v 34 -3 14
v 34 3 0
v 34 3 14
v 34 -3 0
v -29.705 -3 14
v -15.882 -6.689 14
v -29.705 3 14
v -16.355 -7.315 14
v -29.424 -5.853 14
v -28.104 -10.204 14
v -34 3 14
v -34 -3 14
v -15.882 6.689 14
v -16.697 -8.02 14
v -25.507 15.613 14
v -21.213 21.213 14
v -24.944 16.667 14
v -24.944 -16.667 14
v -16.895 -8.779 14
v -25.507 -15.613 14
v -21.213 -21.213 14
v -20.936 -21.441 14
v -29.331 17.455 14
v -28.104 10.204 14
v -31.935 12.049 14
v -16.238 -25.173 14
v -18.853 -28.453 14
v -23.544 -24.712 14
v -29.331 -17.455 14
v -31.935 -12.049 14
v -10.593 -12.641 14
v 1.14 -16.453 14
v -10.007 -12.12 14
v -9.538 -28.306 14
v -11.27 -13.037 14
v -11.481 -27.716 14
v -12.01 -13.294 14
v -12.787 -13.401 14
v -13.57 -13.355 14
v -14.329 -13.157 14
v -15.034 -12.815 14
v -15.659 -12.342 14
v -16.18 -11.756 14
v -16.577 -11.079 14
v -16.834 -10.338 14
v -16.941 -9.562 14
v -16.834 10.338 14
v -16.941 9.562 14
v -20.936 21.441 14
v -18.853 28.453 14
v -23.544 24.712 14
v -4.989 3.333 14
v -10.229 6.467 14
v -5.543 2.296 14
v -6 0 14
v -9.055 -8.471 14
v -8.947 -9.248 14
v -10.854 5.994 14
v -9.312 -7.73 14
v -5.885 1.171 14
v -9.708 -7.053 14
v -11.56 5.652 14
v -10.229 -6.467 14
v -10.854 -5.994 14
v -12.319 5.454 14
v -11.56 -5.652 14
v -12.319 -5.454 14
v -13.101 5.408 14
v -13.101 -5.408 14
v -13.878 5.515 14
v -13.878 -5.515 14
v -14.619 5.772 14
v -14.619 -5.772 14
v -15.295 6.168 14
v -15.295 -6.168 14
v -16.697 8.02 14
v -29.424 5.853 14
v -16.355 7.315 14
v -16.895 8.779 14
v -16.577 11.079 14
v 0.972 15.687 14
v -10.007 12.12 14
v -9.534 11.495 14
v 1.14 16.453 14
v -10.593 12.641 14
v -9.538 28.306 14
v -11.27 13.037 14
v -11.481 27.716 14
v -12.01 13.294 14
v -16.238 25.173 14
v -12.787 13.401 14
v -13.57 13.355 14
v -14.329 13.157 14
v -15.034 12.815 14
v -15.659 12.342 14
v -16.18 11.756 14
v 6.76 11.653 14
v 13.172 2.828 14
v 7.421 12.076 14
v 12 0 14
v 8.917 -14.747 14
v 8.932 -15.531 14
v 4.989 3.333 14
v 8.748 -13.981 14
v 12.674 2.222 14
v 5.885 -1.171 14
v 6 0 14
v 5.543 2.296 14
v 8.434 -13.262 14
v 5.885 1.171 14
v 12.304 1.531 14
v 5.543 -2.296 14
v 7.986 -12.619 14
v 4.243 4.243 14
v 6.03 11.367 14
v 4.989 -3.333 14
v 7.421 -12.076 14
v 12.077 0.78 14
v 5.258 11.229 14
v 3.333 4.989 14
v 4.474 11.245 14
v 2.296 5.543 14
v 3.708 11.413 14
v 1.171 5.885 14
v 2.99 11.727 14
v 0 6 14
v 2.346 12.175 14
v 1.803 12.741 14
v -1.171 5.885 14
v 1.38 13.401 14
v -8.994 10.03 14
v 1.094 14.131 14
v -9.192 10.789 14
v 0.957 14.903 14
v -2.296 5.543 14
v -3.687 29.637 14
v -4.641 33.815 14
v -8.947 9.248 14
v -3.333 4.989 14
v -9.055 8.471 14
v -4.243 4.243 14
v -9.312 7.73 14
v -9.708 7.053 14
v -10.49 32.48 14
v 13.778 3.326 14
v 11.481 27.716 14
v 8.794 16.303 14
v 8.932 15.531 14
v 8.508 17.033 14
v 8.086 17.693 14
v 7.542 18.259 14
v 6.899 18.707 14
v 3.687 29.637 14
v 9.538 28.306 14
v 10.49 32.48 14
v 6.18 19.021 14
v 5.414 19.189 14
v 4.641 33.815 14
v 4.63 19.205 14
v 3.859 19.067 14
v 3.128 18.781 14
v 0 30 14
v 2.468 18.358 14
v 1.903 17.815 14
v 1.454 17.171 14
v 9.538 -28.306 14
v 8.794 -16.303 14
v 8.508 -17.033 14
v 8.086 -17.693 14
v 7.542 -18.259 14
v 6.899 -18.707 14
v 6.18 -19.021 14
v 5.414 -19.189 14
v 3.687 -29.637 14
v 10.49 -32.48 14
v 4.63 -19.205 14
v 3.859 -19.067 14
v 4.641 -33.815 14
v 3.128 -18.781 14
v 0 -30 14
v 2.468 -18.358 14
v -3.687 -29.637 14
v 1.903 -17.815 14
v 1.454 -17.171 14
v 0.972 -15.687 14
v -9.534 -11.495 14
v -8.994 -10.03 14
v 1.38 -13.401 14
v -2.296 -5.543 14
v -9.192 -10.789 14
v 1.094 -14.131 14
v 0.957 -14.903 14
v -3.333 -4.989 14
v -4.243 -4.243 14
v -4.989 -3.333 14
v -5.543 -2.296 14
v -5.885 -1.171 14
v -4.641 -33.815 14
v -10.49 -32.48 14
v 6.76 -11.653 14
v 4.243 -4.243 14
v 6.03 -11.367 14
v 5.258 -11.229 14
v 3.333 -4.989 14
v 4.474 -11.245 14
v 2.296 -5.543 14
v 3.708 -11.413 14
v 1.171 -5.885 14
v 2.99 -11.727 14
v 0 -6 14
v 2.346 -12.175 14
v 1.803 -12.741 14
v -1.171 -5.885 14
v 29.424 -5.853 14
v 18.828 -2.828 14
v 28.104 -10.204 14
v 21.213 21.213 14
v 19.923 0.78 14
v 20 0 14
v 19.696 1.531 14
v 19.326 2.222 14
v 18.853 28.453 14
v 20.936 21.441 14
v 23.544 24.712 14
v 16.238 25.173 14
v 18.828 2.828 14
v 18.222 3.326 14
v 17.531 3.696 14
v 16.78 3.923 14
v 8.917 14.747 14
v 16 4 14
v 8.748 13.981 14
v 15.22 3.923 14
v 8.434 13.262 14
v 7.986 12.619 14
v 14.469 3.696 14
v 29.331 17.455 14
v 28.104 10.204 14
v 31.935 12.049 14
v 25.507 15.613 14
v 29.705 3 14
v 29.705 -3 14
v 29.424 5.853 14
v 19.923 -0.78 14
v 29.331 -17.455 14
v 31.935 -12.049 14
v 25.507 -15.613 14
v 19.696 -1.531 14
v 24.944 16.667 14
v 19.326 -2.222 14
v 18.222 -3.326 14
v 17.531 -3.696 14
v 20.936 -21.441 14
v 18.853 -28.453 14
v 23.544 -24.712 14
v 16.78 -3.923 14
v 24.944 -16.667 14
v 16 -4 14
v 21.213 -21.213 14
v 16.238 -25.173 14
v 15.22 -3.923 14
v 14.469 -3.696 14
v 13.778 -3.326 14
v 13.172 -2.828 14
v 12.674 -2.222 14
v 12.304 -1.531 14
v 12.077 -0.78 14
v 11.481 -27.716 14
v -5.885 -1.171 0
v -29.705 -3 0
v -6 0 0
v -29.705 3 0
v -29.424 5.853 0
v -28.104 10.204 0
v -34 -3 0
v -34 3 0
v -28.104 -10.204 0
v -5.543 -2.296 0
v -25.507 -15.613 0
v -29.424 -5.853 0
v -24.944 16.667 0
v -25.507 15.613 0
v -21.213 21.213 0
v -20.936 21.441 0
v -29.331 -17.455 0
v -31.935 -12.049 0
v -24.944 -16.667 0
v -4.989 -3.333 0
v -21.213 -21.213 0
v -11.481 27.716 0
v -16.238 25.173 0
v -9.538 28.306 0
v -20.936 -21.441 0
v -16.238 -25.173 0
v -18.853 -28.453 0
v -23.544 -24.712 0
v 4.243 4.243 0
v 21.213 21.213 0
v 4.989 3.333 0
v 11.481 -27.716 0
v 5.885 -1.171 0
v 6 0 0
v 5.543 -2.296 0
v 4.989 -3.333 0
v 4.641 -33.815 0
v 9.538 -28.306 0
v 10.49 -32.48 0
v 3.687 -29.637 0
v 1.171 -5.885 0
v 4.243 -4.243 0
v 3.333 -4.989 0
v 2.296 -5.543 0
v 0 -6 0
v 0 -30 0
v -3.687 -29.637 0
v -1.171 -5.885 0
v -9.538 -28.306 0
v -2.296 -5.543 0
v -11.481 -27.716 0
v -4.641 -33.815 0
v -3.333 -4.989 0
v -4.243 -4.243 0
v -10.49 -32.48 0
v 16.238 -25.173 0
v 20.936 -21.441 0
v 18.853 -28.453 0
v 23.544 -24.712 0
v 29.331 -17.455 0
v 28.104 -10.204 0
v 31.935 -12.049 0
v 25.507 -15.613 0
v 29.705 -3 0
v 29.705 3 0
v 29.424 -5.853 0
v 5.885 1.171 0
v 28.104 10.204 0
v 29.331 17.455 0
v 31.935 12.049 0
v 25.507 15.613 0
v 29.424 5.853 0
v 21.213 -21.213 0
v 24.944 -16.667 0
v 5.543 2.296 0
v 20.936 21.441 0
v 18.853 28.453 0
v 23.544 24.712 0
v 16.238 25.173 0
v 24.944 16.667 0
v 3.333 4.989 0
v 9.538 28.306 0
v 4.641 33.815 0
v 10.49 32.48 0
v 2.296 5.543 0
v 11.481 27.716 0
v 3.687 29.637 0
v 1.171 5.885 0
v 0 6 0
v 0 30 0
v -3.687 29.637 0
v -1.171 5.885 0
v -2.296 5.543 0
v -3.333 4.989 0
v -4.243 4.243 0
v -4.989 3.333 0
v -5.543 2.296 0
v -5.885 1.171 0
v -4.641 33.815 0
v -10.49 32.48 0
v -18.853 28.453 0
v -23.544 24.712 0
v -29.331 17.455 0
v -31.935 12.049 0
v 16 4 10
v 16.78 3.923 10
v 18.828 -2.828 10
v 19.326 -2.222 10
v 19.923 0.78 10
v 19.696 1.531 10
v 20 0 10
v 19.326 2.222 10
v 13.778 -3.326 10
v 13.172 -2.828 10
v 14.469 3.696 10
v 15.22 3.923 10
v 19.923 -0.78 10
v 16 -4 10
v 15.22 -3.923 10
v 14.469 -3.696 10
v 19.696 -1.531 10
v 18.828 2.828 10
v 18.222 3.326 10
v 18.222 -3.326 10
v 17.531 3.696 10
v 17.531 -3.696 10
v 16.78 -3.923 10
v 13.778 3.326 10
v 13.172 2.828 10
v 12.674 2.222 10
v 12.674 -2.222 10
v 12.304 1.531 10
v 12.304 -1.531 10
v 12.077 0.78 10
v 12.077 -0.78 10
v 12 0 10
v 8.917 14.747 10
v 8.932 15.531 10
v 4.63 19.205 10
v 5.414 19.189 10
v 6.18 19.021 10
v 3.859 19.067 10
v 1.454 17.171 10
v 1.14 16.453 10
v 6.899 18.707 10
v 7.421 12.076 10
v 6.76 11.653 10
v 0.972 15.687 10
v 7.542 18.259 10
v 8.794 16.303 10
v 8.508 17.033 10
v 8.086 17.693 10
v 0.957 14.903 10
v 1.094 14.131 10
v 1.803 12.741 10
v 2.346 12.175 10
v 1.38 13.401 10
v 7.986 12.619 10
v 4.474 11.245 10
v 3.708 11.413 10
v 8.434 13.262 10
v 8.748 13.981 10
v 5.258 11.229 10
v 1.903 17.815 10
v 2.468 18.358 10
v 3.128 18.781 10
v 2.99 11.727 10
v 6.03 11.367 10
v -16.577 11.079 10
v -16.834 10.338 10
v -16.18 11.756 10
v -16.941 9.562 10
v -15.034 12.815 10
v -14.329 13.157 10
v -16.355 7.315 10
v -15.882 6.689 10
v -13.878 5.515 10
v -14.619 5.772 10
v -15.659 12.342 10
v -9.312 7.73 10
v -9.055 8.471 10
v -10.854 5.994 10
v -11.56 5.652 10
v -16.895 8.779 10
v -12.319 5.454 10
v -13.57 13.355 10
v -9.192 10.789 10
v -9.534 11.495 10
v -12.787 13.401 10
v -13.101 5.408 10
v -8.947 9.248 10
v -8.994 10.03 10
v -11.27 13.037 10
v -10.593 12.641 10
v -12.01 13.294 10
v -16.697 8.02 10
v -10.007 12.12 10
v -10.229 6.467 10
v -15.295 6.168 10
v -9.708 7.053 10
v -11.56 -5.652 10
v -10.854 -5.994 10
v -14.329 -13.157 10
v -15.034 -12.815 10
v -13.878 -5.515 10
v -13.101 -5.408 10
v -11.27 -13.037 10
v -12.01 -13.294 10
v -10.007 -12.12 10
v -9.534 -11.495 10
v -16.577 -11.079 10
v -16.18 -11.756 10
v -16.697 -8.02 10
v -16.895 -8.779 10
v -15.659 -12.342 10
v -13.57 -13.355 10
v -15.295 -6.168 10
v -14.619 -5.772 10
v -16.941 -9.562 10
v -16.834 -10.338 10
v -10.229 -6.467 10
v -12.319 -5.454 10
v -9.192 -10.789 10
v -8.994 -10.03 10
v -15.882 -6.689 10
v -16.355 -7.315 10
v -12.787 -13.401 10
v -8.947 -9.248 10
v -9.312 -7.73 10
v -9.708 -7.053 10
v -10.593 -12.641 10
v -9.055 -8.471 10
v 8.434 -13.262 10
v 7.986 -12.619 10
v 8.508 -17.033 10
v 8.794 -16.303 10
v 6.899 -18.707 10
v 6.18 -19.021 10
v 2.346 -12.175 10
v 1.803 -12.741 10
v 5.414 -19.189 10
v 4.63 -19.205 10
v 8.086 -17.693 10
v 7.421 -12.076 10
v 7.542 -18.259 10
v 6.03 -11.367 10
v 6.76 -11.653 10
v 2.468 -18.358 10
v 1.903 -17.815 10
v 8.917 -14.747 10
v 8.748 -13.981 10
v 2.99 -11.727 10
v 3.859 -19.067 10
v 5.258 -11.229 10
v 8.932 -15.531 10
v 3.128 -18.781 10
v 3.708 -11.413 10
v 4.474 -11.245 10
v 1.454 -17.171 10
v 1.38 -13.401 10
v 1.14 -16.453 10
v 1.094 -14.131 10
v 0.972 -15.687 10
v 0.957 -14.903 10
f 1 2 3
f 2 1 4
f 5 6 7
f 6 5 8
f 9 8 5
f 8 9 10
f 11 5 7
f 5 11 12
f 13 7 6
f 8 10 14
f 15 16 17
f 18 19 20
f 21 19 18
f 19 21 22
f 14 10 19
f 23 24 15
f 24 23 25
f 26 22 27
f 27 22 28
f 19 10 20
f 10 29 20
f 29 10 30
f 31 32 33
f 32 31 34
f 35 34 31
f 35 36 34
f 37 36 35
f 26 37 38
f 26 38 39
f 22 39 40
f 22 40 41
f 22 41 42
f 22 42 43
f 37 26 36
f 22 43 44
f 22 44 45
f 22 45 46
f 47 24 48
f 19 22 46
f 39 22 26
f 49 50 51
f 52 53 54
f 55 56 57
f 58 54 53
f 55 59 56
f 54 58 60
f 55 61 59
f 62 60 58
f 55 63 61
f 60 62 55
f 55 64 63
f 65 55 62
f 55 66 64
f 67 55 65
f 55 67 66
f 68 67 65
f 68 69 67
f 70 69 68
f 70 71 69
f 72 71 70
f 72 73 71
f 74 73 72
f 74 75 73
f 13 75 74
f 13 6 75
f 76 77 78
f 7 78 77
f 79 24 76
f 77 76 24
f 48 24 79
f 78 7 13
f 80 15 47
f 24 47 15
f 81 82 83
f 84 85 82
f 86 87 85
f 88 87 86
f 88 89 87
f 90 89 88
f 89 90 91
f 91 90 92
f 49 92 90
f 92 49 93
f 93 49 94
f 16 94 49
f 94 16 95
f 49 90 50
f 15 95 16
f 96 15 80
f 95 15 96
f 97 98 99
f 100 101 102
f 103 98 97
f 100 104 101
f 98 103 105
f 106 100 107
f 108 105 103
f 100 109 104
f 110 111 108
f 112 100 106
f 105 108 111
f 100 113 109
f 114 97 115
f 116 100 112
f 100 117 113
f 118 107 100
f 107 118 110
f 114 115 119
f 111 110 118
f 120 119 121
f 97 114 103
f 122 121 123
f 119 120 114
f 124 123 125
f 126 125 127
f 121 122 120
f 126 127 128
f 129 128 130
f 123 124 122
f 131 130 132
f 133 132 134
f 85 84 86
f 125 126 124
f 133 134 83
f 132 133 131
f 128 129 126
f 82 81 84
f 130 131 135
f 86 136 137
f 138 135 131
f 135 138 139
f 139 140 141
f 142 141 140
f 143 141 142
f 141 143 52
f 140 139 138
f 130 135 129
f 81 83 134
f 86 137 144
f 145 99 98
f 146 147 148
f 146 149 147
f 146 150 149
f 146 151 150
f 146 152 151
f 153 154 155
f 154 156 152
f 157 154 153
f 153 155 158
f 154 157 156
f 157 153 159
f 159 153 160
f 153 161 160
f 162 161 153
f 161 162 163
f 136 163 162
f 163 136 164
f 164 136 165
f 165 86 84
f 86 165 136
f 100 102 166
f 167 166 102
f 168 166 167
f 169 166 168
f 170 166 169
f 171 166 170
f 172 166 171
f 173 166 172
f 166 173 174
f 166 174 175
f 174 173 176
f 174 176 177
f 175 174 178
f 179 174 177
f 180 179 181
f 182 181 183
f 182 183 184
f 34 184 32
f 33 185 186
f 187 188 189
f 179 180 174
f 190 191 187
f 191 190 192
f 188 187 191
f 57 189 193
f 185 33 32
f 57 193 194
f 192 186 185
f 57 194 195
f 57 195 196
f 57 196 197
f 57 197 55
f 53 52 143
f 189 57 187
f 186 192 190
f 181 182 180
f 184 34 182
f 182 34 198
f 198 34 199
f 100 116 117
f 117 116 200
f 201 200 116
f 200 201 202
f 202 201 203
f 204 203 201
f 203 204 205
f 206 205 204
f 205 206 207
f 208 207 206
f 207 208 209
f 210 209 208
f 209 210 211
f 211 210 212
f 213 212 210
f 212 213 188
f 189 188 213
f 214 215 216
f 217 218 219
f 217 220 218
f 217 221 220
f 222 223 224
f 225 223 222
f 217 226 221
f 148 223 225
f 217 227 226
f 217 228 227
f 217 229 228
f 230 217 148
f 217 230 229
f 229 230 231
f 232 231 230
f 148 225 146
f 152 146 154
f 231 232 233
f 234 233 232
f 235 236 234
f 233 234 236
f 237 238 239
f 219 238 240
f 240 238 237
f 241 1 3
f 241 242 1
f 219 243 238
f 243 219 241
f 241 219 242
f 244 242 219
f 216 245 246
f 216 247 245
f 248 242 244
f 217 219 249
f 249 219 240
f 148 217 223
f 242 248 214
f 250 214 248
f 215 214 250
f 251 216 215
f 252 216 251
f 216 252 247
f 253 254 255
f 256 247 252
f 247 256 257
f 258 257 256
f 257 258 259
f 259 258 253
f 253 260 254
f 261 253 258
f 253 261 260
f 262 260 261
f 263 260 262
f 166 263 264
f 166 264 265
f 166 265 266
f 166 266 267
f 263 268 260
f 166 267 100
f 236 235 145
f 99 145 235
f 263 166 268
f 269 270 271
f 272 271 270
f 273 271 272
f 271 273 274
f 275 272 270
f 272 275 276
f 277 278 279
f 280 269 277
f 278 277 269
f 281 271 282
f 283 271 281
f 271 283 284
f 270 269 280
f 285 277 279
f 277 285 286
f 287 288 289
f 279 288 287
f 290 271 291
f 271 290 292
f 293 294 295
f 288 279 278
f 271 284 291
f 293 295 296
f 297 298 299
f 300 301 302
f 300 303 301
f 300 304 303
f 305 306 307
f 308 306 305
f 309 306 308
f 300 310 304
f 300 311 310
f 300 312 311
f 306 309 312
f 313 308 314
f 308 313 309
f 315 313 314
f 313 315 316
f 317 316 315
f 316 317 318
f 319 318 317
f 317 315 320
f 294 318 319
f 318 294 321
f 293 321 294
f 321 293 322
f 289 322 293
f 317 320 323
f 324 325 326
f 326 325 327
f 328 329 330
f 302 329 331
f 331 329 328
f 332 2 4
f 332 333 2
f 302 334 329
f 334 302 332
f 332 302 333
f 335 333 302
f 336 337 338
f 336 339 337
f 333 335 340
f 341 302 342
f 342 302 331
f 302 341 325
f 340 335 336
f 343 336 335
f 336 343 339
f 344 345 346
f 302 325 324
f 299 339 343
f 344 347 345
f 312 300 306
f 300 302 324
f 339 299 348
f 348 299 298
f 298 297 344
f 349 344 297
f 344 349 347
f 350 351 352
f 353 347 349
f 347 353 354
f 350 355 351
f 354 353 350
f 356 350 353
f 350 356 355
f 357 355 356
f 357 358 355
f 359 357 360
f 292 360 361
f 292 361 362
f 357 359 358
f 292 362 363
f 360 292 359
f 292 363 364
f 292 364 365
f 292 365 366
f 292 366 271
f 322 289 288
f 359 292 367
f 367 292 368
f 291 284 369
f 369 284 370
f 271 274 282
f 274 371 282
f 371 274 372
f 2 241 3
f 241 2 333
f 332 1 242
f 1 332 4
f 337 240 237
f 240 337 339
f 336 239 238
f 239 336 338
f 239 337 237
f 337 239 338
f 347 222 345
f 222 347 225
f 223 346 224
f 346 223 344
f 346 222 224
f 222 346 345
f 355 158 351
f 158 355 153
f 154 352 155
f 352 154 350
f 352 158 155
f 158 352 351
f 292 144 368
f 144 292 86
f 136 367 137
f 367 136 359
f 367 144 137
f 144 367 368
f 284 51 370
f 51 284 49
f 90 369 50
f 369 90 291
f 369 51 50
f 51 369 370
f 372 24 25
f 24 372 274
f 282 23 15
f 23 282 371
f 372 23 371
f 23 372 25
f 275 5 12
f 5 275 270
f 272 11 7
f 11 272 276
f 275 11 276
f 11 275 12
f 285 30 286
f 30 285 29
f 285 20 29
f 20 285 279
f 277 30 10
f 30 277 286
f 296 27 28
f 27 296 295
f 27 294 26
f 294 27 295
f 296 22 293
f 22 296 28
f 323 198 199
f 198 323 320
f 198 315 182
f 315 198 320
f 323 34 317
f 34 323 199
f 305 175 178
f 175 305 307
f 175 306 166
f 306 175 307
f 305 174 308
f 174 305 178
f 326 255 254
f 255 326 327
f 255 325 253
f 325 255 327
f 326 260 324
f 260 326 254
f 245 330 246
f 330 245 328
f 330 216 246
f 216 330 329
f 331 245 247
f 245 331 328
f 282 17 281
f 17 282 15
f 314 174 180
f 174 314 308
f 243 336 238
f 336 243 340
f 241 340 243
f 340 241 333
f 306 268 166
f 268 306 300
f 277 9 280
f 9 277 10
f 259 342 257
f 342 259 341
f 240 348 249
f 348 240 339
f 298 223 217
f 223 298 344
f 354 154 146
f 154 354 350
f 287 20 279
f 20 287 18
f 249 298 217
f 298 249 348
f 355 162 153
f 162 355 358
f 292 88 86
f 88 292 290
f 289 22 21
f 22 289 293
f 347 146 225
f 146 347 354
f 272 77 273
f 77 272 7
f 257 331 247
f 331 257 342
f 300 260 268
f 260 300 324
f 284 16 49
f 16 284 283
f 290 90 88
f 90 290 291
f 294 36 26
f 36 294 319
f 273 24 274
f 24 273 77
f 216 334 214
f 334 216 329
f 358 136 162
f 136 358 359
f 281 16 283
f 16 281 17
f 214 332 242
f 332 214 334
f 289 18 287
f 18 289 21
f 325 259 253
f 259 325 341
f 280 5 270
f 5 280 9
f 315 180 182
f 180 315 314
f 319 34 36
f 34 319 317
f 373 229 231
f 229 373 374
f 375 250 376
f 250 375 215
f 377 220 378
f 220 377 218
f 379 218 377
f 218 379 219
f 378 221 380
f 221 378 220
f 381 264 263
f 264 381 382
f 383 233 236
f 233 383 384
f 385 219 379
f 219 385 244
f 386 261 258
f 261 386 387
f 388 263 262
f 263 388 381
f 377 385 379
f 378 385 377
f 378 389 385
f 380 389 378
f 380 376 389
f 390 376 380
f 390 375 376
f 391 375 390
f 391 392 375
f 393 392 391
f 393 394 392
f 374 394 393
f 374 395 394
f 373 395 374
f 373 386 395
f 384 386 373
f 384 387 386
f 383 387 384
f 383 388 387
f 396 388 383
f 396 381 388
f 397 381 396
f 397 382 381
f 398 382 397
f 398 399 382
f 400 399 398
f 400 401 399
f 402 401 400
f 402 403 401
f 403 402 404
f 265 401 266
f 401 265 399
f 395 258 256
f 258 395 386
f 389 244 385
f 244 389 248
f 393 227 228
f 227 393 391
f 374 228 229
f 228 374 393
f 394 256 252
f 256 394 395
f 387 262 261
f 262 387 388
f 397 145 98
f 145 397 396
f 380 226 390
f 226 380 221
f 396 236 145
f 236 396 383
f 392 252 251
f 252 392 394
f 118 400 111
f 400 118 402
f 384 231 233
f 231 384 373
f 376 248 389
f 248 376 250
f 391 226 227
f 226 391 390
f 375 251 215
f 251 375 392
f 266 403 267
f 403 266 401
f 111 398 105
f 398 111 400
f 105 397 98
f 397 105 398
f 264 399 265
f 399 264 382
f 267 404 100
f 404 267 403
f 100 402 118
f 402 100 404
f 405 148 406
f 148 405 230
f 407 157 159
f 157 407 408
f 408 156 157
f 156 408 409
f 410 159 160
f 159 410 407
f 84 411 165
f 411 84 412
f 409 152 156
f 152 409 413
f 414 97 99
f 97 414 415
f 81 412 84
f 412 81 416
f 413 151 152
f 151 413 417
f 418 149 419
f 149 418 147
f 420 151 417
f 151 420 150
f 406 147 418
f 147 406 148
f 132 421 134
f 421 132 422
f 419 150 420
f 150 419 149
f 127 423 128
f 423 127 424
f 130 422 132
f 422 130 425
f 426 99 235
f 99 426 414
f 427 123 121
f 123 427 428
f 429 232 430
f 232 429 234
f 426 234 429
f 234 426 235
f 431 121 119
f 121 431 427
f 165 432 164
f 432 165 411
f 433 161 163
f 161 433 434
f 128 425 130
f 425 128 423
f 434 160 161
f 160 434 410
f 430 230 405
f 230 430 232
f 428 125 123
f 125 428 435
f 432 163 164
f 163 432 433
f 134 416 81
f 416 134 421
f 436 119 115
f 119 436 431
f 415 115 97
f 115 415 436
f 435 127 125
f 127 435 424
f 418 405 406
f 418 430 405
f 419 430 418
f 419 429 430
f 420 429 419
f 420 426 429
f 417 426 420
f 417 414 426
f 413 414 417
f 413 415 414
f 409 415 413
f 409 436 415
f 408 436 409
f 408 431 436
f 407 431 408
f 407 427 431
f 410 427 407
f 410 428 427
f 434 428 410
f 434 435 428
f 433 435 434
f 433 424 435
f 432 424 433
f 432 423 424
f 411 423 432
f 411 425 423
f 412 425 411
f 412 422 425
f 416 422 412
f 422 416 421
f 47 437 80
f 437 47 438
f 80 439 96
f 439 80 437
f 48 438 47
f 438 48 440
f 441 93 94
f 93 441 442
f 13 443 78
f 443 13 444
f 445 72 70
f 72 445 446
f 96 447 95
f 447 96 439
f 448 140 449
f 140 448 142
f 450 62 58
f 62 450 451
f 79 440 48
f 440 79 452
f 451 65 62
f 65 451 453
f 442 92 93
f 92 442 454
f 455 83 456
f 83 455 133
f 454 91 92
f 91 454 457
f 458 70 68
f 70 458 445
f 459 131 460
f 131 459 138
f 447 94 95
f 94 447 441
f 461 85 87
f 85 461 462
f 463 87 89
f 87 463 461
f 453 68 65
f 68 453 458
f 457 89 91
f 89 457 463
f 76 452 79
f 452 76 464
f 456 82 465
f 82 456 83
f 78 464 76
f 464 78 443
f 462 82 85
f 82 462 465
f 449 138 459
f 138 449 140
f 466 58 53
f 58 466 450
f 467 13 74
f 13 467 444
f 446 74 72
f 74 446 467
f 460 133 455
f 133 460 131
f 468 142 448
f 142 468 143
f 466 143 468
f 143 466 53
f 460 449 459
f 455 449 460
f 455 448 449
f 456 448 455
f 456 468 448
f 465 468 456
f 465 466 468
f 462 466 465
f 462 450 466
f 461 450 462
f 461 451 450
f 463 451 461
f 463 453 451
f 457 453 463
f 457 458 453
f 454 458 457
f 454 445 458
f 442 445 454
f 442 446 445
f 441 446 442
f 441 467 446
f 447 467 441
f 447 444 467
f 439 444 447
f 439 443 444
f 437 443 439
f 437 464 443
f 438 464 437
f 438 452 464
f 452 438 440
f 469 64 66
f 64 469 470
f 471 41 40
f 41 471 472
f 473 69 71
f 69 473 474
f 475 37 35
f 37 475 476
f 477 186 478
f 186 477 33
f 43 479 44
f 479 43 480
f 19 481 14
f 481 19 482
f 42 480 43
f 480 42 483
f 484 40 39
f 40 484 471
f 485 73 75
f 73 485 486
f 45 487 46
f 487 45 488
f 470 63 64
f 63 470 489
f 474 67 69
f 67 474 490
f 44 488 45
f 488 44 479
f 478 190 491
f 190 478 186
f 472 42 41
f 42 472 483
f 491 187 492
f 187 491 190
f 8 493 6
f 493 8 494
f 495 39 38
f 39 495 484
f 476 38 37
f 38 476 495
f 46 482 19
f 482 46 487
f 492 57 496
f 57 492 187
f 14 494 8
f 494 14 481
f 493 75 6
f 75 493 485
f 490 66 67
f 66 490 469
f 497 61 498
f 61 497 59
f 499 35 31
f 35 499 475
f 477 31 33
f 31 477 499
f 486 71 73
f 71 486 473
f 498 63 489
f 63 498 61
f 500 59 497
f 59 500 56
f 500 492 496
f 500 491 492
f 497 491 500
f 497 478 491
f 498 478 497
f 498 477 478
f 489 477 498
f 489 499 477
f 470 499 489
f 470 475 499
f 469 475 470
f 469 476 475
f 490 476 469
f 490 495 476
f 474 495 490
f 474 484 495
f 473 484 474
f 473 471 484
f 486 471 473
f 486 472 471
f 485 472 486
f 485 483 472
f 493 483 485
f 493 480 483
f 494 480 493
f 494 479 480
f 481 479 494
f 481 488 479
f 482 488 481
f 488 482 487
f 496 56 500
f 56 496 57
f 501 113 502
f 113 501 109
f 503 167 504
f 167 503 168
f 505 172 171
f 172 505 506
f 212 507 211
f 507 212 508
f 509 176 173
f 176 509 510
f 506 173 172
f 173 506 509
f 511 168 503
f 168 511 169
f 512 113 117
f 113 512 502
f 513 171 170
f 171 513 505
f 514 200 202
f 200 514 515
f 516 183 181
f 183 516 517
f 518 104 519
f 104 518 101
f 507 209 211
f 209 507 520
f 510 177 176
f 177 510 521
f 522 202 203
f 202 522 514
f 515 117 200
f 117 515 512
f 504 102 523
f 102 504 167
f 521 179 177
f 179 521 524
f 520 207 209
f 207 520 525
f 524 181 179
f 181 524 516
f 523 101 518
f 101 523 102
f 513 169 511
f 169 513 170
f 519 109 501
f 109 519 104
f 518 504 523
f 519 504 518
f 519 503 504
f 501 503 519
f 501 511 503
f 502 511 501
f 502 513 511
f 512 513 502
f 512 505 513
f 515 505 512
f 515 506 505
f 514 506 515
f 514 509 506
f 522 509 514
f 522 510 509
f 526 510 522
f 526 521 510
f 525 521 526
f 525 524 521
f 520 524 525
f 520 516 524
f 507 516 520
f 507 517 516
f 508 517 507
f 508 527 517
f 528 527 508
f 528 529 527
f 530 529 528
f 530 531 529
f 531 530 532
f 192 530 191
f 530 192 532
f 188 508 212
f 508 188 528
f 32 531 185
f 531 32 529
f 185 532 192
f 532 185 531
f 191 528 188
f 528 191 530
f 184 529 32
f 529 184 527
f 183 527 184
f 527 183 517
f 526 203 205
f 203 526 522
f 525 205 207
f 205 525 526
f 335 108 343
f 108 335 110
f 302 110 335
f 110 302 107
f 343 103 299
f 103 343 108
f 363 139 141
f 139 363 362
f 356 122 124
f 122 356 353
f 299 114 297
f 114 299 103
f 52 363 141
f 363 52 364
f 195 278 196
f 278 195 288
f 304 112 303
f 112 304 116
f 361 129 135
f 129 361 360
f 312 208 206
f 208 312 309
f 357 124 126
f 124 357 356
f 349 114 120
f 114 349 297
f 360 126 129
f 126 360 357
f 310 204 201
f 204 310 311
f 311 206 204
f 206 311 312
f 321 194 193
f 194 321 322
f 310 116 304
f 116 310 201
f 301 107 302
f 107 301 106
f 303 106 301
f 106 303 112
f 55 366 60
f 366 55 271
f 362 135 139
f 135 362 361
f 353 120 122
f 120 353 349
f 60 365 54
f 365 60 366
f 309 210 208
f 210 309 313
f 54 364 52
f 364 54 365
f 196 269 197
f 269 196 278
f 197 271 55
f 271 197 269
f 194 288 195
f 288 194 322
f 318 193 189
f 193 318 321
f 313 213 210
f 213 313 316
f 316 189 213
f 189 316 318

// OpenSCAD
$fn = 32;

// ----------------------------------------------------------------------
// Spur blank: lightened gear blank
// ----------------------------------------------------------------------

// --- parameters (mm) ---
disc_r = 30;              // blank root radius
disc_t = 14;              // blank thickness
n_teeth = 14;             // stub tooth count
tooth_w = 6;              // tooth width at the root
tooth_h = 4;              // tooth height above the root
bore_r = 6;               // central bore radius
ring_r = 16;              // lightening pocket ring radius
pocket_r = 4;             // lightening pocket radius

out_r = disc_r + tooth_h;  // tip radius
bbox_x = 68.0;  // measured width over the teeth
bbox_y = 67.63;  // measured depth over the teeth

difference() {
union() {
  cylinder(r = disc_r, h = disc_t);
  for (i = [0 : n_teeth - 1])
    rotate([0, 0, i * 360 / n_teeth])
      translate([disc_r - 1, -tooth_w / 2, 0])
        cube([tooth_h + 1, tooth_w, disc_t]);
}
  translate([0, 0, -1]) cylinder(r = bore_r, h = disc_t + 2);
  for (i = [0 : 5])
    rotate([0, 0, i * 72])
      translate([ring_r, 0, disc_t - 4])
        cylinder(r = pocket_r, h = 5);
}
